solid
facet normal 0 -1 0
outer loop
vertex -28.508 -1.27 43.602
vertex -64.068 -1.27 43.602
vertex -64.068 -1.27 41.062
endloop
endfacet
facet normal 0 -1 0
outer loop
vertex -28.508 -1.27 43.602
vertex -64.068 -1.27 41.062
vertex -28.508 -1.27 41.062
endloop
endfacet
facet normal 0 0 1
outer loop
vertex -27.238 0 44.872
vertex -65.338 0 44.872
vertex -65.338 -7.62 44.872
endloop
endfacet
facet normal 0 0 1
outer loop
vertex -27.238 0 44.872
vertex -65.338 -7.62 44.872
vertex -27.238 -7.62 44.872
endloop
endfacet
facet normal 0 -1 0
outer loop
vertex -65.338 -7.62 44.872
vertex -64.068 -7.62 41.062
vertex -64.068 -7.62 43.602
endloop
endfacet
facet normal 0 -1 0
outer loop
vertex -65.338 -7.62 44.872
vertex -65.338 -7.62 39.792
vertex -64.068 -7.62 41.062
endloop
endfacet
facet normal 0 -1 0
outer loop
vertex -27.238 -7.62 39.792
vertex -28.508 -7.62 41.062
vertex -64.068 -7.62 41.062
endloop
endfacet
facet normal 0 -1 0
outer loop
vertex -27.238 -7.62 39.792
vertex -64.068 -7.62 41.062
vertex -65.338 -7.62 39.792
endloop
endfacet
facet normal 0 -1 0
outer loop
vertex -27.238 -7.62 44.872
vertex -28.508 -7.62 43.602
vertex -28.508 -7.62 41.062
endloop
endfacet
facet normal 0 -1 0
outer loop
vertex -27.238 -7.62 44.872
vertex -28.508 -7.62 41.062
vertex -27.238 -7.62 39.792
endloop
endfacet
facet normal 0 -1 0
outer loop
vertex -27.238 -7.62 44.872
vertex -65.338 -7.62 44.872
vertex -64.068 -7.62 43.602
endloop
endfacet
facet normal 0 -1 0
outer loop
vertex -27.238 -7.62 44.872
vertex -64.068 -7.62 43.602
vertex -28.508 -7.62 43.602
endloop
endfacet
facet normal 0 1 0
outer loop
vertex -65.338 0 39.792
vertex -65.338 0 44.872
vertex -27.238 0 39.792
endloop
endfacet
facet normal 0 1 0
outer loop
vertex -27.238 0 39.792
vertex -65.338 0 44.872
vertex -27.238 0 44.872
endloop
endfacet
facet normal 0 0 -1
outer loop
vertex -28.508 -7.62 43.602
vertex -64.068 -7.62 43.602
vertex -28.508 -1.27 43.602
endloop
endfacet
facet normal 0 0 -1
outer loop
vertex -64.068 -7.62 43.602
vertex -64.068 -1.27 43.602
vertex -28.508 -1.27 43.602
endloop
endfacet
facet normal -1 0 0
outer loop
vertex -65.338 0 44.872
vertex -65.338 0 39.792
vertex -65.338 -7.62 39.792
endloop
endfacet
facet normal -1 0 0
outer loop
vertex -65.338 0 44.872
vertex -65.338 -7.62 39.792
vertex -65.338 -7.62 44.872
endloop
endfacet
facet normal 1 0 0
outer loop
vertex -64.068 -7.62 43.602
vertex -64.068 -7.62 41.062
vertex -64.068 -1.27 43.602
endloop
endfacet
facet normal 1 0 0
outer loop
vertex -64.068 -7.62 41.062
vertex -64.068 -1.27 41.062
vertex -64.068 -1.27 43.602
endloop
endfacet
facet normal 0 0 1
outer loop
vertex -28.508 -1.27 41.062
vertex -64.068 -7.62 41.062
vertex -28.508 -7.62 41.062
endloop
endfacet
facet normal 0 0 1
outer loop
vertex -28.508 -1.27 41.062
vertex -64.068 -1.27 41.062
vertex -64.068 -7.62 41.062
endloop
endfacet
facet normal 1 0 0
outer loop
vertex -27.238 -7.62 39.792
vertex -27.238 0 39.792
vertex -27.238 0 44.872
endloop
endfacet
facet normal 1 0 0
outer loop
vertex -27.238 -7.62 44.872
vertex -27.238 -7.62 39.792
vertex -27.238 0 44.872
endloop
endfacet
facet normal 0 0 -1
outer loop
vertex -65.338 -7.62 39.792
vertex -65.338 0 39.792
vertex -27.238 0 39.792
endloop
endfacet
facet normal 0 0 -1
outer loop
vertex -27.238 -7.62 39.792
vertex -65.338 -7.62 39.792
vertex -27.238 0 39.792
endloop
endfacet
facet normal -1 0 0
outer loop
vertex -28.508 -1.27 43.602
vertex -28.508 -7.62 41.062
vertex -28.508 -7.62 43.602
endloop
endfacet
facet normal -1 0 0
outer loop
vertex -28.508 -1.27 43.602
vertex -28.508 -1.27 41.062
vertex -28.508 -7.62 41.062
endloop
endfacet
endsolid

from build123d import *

# Parameters (mm, degrees)
F0_W     = 38.1
F0_H     = 5.08
F1_DEPTH = 7.62
F3_T     = -1.27


# Not quite as in the source:
# - a feature of the source that left no trace in its solid (it failed there, or was rolled back) is left out


with BuildPart() as f1:
    # F0 (on Front) → F1 (new body)
    with BuildSketch(Plane.XZ):
        with Locations((-46.2881572708, 42.3315375688)):
            Rectangle(F0_W, F0_H)
    extrude(amount=F1_DEPTH)

    # F3
    f3_openings = [f1.faces().sort_by_distance(p)[0] for p in [
        (-46.288157, -7.62, 42.331538),
    ]]
    offset(amount=F3_T, openings=f3_openings)


solid = f1.part
